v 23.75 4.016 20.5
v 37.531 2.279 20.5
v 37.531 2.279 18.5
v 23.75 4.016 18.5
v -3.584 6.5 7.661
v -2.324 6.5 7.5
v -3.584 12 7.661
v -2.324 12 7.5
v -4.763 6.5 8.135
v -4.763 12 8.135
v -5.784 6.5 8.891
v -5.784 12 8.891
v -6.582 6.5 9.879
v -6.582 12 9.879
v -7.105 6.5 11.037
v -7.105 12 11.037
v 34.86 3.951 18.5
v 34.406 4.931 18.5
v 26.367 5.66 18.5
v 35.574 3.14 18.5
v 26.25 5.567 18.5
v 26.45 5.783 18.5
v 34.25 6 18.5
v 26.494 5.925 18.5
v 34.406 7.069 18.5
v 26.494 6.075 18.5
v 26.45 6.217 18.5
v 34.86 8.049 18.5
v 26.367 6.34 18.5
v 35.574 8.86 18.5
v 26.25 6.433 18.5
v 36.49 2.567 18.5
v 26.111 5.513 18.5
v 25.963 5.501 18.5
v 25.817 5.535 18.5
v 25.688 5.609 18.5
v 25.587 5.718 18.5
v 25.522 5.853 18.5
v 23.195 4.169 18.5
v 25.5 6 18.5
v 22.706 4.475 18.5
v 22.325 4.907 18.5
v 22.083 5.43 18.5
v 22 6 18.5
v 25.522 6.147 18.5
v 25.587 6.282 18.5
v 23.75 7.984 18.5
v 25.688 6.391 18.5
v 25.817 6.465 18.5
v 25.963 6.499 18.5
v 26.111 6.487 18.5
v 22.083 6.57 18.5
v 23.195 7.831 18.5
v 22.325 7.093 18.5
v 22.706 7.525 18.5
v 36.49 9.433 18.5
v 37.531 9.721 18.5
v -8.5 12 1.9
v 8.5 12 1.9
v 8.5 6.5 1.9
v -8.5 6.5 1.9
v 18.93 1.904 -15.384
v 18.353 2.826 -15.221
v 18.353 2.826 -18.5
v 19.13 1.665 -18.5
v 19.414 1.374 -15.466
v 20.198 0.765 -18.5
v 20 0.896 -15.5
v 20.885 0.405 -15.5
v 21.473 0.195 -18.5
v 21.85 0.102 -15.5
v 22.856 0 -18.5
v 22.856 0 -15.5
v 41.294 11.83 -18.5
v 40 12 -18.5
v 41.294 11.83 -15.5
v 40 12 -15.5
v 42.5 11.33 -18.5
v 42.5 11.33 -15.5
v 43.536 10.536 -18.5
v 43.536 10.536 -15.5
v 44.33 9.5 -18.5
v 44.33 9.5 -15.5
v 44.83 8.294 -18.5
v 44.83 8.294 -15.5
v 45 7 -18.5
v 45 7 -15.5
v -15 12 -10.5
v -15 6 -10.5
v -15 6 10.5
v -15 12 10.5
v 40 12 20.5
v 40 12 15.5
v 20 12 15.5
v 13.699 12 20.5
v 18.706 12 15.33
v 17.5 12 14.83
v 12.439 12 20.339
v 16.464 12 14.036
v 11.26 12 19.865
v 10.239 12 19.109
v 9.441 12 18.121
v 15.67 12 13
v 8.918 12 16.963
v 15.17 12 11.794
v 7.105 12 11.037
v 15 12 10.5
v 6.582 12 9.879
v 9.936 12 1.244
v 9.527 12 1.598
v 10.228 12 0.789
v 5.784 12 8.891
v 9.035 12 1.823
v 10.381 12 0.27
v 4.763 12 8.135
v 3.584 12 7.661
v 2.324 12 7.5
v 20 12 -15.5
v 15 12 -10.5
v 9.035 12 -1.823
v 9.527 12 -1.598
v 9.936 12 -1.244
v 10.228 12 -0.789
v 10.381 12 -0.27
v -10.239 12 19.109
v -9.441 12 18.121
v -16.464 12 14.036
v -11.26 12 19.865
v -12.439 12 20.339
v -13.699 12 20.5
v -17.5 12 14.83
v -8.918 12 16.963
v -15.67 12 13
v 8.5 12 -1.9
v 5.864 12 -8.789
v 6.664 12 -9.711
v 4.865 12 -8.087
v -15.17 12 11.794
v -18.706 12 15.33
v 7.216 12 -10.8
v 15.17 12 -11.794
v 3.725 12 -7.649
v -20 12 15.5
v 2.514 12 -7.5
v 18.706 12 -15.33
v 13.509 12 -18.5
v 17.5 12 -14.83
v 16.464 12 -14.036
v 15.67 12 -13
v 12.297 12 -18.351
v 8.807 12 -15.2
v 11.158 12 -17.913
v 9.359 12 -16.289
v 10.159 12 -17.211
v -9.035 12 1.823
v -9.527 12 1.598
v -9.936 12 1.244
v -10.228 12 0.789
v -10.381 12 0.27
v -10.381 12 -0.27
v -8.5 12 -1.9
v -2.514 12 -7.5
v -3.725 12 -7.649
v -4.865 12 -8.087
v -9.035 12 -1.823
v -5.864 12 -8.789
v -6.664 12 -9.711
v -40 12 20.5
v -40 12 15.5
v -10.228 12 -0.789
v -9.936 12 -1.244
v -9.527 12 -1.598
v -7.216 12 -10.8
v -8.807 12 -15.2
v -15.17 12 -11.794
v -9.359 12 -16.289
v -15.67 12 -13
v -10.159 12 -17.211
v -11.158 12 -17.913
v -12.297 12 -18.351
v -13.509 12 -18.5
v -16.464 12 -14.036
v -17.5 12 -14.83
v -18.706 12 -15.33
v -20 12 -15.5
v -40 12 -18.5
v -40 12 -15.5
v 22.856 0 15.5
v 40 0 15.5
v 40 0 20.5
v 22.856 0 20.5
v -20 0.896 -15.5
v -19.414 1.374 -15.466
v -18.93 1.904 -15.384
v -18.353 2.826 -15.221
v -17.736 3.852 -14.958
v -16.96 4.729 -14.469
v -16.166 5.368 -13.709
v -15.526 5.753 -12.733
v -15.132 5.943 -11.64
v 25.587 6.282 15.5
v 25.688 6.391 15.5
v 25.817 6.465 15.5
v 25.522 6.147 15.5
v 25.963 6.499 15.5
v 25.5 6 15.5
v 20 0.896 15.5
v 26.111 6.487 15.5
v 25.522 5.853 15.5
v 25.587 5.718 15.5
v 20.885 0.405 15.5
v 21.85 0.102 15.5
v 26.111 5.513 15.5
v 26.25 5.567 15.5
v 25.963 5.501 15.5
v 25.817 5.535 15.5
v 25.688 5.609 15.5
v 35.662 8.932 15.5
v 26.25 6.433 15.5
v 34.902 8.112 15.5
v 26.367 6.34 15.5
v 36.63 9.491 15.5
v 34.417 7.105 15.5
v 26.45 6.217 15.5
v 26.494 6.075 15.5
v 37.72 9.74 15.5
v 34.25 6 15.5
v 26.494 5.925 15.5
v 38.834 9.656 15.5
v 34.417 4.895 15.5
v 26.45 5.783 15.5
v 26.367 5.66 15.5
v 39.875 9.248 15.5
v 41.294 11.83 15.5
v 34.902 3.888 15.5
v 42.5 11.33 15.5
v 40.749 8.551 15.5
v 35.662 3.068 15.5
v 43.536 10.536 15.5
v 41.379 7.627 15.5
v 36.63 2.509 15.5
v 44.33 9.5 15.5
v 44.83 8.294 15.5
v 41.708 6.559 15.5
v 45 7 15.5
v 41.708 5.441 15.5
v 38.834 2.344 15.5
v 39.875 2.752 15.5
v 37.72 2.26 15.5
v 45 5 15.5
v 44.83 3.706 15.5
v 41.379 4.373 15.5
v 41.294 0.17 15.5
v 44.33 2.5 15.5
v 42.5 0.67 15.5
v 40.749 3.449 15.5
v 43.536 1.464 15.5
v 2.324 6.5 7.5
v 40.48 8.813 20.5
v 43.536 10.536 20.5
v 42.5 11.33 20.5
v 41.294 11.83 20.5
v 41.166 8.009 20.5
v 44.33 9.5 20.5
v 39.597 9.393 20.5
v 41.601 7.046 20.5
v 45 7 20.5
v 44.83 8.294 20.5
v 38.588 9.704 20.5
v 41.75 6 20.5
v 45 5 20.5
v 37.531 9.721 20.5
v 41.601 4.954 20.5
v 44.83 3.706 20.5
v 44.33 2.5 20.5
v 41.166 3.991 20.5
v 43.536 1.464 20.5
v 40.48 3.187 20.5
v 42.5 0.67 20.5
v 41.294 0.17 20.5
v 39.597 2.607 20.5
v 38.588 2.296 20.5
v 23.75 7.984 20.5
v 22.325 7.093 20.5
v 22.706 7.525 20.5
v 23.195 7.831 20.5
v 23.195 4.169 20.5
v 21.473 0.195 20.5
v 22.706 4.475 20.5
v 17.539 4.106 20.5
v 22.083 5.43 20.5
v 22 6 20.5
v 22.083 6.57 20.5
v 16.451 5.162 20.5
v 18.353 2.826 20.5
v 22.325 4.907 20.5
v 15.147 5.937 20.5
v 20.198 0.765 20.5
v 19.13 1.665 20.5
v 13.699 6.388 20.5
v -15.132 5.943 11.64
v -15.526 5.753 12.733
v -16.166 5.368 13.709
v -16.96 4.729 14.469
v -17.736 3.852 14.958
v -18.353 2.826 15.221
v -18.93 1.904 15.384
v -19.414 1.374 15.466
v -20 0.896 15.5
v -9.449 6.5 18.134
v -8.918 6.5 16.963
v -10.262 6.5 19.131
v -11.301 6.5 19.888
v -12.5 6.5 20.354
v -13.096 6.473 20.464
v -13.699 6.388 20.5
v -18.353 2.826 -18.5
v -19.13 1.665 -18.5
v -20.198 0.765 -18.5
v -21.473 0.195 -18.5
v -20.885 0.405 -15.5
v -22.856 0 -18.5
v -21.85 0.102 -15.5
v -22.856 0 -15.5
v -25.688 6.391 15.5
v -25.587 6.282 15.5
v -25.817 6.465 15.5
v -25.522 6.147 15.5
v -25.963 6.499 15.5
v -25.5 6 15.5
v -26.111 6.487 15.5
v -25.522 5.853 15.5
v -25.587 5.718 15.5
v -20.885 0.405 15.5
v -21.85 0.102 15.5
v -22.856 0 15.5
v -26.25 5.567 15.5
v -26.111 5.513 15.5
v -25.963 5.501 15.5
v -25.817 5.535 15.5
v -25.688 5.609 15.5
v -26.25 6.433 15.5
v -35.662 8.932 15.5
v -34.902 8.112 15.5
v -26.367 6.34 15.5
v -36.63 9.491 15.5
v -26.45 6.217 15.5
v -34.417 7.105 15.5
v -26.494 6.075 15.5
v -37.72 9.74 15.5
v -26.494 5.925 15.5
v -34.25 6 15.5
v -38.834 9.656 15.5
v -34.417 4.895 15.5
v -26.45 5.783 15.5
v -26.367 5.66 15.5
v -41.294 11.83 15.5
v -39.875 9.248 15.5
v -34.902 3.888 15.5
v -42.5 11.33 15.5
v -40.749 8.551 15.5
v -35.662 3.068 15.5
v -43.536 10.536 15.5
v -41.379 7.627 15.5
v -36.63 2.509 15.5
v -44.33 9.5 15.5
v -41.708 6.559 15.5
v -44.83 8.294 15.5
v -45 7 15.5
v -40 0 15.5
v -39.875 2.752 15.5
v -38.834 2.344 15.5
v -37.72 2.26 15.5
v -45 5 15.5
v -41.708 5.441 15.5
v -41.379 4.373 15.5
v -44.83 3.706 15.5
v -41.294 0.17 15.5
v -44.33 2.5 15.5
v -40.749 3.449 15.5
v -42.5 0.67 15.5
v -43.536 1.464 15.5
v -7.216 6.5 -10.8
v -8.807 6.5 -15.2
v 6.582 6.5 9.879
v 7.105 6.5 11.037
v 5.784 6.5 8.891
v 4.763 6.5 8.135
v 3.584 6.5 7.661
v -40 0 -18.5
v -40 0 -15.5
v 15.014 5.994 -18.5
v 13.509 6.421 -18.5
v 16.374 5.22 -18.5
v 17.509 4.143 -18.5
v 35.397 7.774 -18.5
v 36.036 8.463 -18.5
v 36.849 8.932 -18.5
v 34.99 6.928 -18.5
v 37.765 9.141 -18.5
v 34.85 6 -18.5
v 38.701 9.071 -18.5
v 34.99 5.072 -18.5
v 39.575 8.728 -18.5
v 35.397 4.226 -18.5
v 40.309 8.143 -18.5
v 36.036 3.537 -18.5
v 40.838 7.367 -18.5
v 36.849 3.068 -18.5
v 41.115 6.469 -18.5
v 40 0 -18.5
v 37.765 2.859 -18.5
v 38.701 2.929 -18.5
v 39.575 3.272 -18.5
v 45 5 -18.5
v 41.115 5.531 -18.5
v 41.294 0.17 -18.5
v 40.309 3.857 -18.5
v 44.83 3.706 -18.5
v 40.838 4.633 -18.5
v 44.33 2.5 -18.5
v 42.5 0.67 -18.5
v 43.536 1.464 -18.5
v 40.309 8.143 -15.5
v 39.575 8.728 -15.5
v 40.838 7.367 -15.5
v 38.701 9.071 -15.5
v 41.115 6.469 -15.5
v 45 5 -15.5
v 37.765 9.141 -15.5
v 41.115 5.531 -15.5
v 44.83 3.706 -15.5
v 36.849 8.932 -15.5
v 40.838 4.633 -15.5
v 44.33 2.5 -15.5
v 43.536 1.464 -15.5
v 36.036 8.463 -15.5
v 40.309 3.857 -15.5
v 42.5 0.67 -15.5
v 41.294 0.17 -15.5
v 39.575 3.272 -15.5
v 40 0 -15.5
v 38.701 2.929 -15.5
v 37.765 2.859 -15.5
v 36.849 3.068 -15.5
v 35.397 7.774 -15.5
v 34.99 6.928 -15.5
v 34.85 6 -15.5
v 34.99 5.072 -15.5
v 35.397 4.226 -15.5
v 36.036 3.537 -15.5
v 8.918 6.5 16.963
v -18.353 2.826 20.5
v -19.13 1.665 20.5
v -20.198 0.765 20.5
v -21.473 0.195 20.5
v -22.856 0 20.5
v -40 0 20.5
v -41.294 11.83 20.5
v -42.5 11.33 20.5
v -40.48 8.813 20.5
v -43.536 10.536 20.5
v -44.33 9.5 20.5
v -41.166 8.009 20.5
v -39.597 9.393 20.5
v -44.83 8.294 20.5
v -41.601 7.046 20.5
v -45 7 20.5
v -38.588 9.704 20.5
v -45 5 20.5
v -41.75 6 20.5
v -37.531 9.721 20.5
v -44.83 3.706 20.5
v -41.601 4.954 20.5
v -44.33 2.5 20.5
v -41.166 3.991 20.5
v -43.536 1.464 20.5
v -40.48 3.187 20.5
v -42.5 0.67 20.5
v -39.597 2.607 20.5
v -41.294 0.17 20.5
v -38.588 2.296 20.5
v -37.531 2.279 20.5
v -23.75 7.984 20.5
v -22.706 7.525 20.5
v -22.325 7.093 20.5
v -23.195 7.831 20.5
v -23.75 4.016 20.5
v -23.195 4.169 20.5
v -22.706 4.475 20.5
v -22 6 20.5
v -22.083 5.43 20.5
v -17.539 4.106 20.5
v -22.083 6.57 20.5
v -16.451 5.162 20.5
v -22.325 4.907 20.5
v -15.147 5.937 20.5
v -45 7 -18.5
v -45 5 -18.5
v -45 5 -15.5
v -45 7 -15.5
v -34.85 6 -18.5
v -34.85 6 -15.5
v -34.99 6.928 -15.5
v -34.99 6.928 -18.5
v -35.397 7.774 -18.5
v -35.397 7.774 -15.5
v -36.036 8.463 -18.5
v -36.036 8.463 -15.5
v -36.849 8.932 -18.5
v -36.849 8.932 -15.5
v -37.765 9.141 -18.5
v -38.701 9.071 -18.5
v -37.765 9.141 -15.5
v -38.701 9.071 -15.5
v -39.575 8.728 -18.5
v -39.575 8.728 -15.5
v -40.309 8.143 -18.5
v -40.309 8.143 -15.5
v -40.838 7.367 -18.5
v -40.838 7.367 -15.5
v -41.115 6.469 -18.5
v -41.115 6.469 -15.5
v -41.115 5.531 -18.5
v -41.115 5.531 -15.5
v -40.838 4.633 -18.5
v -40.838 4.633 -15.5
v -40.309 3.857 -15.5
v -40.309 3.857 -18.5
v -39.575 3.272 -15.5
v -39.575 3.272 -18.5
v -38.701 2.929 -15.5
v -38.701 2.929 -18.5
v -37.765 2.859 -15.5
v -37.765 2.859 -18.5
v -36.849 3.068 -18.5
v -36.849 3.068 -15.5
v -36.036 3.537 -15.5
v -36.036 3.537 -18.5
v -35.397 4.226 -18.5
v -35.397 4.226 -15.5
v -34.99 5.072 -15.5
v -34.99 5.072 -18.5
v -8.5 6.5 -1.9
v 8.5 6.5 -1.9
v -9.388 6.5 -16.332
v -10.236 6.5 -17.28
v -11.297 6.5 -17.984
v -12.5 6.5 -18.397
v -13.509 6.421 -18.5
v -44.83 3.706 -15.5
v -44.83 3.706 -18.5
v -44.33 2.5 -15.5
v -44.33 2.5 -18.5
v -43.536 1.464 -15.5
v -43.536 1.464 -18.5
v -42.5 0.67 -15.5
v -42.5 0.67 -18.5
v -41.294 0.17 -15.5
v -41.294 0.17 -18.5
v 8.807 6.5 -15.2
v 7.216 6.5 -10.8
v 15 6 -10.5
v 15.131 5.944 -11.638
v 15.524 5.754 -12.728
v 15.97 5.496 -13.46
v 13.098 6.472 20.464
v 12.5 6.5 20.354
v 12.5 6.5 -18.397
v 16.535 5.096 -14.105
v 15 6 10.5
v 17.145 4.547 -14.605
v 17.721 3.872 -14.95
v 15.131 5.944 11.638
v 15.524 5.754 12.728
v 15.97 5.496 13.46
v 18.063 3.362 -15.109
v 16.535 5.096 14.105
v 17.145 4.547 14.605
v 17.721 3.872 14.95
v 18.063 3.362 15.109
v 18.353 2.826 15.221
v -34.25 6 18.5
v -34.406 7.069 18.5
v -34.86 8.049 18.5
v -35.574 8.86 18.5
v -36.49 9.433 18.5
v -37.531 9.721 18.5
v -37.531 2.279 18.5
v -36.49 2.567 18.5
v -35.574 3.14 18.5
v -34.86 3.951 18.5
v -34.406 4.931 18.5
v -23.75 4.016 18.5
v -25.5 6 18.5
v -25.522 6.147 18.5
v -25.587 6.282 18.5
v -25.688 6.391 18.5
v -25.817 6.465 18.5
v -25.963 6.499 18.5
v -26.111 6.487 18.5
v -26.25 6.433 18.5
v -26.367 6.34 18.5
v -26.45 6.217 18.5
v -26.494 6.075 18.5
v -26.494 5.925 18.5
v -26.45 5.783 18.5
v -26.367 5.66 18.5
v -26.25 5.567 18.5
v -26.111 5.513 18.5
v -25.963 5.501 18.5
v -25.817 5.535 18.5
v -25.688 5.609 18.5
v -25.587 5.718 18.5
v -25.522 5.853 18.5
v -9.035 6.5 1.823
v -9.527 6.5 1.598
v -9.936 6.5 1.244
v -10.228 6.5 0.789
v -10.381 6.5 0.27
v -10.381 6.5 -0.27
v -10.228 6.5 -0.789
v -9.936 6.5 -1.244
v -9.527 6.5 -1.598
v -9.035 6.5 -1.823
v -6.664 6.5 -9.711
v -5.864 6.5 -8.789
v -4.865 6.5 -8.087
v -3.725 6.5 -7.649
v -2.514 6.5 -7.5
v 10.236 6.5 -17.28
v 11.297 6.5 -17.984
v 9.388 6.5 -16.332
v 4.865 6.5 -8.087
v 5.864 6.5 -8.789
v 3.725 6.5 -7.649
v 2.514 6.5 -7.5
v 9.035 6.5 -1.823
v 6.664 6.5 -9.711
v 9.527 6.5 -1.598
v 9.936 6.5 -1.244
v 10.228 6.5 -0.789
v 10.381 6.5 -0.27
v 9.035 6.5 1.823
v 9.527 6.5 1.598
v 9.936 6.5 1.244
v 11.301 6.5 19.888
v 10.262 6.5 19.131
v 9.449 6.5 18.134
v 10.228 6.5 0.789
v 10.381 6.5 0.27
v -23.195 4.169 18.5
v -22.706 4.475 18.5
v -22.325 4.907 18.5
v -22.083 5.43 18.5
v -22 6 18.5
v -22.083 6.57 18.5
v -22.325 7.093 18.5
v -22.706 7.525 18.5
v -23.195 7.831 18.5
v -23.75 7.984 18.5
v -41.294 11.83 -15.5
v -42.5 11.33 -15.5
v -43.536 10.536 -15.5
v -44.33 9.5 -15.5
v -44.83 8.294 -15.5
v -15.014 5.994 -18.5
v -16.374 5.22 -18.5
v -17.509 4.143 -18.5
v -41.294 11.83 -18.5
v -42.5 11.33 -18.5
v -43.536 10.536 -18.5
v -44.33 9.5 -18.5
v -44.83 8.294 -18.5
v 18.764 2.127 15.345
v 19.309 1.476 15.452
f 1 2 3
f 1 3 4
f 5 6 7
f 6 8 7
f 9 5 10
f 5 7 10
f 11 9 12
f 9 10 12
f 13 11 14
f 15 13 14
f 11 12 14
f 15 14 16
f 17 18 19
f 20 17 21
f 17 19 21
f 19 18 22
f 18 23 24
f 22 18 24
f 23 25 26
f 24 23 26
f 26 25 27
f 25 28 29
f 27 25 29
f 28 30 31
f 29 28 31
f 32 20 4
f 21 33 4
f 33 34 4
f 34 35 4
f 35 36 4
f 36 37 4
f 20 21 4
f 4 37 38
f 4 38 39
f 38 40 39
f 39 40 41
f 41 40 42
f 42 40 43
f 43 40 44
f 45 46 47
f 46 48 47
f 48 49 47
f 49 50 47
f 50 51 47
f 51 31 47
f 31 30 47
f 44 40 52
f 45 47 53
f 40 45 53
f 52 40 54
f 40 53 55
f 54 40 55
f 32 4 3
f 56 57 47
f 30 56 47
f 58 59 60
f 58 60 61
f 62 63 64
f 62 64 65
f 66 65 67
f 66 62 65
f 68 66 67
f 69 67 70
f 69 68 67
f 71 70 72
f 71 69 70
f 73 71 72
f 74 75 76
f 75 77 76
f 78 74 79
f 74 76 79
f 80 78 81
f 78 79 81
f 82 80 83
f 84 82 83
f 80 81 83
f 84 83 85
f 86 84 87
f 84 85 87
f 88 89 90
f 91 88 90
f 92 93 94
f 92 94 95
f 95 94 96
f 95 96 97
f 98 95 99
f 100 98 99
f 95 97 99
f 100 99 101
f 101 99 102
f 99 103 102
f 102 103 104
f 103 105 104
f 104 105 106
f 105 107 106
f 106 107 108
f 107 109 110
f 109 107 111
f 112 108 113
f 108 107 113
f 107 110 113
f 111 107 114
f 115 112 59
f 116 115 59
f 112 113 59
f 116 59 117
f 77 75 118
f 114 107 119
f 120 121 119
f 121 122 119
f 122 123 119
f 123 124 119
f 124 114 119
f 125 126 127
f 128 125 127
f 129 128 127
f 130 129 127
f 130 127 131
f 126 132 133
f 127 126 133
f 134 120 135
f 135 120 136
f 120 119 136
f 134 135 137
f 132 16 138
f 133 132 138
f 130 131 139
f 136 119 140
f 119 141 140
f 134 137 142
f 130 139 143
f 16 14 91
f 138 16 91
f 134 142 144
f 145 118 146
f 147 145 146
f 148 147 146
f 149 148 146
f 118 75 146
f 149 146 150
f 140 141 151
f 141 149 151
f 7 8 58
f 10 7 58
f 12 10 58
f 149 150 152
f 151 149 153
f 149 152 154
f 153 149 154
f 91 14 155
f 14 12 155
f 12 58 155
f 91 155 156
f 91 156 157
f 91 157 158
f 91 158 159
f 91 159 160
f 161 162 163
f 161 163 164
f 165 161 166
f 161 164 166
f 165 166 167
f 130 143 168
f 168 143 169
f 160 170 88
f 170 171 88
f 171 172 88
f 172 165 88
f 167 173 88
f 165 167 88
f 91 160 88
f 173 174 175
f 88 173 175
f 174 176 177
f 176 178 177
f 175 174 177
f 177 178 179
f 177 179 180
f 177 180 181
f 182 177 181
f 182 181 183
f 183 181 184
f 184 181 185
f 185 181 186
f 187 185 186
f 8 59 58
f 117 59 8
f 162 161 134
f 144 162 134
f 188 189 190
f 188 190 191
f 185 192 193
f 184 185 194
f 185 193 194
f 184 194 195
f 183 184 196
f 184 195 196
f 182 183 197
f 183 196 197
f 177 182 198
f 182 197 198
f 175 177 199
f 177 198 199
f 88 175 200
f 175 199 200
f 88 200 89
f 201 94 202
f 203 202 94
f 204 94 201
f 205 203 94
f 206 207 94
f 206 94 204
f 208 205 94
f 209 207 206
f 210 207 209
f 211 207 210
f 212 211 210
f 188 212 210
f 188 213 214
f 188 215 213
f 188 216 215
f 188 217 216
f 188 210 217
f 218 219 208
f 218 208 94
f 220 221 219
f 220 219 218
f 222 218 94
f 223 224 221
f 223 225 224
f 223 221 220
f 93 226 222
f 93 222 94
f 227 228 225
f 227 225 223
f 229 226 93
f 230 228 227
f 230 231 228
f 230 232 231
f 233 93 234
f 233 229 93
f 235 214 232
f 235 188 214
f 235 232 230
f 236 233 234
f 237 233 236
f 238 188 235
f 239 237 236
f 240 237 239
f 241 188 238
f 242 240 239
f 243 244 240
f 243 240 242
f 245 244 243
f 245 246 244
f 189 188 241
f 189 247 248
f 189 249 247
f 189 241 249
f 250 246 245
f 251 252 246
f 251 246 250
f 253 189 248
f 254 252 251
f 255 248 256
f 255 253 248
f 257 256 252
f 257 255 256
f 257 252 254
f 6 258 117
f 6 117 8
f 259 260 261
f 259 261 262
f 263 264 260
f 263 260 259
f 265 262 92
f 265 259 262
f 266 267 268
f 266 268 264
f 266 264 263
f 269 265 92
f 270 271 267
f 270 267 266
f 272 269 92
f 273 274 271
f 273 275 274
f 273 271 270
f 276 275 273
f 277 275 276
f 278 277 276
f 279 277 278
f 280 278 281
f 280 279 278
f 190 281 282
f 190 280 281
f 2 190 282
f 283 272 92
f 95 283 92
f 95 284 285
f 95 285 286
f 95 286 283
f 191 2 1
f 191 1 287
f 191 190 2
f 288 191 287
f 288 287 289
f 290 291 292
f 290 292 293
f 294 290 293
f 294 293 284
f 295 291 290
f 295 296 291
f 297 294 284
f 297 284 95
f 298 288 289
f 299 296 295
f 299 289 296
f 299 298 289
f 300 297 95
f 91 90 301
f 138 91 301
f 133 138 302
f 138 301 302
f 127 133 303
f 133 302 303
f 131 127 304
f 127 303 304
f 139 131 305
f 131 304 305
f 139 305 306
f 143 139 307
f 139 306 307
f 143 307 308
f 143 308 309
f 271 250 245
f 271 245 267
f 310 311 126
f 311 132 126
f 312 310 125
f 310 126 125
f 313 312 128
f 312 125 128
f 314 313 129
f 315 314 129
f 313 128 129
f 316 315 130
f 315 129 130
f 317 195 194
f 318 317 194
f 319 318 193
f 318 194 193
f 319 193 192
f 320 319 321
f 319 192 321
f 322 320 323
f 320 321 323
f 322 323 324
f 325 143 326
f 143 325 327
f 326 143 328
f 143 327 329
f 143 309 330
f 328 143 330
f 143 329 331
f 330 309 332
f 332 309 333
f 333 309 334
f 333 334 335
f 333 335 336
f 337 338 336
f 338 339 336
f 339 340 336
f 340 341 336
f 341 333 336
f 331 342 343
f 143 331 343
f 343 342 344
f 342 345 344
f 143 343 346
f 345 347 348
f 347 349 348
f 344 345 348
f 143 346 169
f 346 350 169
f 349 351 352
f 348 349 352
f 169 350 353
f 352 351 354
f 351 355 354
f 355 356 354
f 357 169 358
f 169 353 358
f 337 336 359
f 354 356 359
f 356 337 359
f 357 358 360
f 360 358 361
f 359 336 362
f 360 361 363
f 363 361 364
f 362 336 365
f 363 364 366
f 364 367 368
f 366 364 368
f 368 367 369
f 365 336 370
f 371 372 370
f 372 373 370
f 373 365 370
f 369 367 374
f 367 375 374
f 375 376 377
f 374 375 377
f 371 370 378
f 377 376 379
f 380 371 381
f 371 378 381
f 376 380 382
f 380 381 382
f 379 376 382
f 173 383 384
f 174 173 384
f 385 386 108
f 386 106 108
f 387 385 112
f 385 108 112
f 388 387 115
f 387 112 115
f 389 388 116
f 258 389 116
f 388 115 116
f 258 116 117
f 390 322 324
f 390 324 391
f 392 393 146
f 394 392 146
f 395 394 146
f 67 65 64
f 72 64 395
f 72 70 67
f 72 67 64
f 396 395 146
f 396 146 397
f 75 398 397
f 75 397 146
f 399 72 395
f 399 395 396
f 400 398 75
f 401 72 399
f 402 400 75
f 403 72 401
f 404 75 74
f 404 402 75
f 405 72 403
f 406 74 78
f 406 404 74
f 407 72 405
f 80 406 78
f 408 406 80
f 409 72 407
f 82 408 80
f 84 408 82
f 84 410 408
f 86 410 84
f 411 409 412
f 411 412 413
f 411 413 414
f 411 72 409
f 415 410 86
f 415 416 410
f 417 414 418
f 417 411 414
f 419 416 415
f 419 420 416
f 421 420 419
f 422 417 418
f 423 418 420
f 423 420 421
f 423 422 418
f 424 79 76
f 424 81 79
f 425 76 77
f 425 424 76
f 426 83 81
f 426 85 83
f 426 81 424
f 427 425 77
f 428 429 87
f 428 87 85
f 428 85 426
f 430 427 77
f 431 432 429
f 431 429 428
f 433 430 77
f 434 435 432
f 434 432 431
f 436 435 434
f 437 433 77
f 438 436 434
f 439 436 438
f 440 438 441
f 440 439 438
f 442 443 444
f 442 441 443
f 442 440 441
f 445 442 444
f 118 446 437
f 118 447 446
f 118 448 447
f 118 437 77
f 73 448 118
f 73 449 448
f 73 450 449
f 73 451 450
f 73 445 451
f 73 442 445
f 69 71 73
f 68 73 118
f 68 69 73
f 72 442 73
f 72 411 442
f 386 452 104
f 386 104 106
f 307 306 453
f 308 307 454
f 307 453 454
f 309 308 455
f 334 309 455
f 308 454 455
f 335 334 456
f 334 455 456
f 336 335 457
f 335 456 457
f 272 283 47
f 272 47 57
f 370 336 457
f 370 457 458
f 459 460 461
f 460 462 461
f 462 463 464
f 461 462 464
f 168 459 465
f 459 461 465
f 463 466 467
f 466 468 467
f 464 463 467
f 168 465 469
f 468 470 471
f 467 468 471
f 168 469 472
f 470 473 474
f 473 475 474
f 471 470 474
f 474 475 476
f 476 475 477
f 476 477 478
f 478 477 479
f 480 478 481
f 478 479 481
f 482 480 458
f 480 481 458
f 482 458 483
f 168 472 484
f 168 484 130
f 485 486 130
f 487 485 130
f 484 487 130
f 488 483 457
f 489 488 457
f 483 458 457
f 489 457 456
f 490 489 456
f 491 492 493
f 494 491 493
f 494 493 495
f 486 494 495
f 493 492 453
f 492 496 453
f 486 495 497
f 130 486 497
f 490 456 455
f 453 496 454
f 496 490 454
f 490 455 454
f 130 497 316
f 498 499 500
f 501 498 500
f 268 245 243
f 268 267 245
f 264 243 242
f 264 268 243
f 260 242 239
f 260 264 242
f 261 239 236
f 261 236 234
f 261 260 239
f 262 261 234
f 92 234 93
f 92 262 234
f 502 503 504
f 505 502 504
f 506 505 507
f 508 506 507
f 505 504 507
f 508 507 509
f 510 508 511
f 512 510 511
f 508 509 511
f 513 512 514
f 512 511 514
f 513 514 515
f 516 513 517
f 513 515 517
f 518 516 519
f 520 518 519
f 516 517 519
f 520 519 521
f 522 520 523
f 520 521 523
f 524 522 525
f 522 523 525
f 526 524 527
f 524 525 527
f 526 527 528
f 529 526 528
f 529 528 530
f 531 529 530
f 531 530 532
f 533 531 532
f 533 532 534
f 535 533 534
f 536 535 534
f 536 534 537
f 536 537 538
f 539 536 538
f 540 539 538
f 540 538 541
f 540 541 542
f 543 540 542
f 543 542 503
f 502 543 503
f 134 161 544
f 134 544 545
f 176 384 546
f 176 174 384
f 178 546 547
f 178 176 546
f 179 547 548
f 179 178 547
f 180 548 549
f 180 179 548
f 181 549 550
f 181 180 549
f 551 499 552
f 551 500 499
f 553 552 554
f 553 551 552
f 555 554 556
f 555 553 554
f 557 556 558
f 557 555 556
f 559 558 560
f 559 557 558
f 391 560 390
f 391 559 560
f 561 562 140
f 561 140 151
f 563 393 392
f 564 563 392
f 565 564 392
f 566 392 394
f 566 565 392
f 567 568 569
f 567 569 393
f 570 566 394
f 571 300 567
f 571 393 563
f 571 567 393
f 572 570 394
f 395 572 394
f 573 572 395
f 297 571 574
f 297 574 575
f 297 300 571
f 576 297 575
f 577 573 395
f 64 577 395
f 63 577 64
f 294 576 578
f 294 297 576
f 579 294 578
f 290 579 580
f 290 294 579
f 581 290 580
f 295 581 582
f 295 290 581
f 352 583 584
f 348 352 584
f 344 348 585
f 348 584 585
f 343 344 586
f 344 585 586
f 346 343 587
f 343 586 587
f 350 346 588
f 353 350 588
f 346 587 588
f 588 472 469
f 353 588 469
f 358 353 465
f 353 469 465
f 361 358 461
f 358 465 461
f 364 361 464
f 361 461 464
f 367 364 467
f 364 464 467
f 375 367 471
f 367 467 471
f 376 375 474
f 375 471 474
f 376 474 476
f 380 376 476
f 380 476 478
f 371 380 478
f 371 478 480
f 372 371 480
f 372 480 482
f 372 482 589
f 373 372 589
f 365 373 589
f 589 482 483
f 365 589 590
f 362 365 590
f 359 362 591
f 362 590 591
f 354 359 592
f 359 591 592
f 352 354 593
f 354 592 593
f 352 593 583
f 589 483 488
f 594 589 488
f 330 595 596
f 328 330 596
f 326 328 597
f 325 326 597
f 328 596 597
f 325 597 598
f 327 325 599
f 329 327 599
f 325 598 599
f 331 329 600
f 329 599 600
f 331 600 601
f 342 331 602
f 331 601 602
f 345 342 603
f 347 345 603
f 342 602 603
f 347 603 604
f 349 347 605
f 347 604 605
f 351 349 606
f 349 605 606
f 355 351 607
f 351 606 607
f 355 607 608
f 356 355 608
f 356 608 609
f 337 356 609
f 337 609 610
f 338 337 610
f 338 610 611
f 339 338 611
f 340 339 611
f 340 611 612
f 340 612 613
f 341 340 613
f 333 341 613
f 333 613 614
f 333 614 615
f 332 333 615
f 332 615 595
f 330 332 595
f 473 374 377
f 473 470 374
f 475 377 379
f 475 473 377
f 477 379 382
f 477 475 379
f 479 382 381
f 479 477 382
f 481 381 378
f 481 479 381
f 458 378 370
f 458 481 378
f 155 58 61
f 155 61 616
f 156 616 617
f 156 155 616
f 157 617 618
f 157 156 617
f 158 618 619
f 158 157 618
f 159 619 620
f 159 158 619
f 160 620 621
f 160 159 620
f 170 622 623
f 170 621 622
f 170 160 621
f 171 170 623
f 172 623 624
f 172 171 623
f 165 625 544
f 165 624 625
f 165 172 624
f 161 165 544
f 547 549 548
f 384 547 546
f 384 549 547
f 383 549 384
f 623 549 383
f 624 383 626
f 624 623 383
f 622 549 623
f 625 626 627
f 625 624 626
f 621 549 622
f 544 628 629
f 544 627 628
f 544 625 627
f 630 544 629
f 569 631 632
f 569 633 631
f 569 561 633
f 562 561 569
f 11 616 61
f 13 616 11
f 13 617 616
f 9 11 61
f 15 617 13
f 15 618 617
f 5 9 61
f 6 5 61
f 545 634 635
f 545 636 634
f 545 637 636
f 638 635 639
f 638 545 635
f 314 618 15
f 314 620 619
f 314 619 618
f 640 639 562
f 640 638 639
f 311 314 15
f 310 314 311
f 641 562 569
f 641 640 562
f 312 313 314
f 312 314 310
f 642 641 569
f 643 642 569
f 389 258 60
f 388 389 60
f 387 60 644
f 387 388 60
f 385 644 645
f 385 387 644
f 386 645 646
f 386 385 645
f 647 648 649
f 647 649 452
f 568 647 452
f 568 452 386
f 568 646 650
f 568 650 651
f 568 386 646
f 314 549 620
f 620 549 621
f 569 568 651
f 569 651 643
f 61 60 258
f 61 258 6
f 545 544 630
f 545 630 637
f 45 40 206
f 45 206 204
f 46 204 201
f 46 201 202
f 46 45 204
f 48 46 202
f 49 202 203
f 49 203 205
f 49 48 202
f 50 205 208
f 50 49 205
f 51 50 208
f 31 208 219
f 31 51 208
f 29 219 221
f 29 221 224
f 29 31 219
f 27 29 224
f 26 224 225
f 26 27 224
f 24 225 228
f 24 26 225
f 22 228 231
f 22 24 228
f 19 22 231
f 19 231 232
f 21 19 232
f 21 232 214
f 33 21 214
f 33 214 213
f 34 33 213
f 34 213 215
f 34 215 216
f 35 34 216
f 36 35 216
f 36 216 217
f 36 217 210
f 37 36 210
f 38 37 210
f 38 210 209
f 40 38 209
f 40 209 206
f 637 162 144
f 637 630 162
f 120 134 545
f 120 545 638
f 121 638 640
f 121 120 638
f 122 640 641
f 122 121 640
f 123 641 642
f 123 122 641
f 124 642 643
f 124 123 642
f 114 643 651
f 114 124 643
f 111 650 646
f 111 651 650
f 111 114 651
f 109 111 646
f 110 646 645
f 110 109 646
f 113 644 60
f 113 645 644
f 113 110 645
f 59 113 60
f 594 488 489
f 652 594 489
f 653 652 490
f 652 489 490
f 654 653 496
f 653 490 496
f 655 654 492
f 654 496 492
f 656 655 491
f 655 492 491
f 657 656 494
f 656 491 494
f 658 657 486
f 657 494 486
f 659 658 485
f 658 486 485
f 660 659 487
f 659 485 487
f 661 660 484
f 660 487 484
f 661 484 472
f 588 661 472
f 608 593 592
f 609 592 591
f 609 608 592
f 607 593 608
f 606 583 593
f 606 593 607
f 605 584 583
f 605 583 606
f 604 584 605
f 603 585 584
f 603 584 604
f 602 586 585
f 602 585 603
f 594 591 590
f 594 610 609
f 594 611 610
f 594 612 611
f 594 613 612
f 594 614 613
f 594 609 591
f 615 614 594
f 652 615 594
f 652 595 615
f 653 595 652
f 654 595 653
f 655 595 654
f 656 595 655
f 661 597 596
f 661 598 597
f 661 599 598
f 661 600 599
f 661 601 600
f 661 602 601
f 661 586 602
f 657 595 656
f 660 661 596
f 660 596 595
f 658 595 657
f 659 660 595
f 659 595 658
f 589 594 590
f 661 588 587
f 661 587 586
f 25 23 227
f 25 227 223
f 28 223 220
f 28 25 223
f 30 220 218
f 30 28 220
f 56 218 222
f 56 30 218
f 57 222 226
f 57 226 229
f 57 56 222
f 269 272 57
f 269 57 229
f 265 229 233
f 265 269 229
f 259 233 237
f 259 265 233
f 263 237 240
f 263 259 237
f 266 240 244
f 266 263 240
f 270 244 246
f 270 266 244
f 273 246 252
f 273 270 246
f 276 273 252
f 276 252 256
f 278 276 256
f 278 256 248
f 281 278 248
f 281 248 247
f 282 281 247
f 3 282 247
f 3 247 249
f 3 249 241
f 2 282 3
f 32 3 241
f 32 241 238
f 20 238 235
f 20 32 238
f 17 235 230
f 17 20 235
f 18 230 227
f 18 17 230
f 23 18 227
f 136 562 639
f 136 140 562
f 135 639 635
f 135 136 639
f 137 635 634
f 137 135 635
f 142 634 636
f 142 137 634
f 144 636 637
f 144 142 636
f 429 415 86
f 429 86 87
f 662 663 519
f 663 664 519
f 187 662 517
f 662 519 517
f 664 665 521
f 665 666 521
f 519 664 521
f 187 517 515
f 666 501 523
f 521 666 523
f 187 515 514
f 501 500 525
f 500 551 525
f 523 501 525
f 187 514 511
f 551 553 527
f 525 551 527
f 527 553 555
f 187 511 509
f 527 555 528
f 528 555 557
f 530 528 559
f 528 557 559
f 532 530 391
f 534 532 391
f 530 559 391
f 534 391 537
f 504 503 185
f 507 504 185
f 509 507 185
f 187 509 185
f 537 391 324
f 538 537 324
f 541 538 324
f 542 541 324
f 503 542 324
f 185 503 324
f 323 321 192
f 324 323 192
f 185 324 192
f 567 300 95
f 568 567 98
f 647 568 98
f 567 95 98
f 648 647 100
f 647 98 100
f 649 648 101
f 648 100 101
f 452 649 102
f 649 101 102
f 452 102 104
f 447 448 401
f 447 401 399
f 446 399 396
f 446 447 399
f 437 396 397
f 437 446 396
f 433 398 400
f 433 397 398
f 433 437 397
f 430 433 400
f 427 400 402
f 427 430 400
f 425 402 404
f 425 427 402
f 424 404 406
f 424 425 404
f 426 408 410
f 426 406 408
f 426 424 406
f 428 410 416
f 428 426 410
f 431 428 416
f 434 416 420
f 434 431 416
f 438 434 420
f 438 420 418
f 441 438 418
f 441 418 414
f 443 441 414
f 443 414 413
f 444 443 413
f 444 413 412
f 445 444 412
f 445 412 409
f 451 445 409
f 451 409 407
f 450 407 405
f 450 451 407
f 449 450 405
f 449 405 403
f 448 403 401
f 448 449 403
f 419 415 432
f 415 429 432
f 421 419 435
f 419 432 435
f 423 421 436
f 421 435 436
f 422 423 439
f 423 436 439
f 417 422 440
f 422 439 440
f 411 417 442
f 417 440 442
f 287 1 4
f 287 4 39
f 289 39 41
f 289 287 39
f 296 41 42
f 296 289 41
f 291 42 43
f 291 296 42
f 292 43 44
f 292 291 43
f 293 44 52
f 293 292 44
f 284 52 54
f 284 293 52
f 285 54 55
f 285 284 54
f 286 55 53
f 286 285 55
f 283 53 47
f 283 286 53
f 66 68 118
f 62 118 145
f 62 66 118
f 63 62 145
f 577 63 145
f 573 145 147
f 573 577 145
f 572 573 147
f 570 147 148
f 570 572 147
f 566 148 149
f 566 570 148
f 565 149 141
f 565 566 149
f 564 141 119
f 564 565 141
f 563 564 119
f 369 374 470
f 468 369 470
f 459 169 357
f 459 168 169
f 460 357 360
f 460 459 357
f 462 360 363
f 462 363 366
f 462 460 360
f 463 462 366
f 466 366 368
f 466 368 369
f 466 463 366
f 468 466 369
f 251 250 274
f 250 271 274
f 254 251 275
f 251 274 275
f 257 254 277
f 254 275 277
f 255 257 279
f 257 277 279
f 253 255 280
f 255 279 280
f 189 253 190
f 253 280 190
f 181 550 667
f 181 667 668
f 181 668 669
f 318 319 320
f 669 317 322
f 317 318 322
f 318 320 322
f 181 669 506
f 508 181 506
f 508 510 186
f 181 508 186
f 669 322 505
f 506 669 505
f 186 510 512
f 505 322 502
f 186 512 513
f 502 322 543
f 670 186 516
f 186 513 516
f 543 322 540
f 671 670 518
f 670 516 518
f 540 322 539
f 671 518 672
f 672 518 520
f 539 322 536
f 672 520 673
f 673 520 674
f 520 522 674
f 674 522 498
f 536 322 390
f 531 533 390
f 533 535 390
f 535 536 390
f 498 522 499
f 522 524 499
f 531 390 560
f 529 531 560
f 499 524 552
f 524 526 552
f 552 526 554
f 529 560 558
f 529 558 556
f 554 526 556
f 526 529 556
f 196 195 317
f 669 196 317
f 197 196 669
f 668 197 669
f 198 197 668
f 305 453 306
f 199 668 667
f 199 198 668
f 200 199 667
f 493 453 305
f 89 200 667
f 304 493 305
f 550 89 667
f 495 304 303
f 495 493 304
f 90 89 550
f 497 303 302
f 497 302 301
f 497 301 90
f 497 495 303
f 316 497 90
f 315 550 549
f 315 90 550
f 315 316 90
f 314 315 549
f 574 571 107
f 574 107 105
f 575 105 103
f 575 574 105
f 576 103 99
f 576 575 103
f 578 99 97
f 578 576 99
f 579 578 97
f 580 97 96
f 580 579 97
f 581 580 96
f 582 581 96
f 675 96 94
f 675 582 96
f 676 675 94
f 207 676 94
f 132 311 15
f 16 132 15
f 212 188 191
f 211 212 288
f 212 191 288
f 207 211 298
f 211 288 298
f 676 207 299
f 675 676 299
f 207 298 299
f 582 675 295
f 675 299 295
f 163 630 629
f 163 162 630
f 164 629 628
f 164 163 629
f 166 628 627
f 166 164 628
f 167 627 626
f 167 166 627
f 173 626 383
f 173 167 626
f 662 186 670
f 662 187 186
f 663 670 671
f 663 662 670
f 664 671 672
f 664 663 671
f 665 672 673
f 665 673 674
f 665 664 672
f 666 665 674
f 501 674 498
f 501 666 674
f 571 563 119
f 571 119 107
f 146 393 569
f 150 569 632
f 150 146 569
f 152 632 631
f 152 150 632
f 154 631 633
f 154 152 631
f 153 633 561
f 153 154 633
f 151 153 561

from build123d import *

# Parameters (mm, degrees)
Y_KSEKLIK_EKSTR_ZYON1_DEPTH = 12
IZIM3_R                     = 3.15
KES_EKSTR_ZYON1_DEPTH       = 61.745370194
KES_EKSTR_ZYON2_DEPTH       = 2
KES_EKSTR_ZYON5_REACH       = 62.745
IZIM8_R                     = 3.75
KES_EKSTR_ZYON3_REACH       = 61.481
IZIM6_R                     = 0.5
KES_EKSTR_ZYON4_DEPTH       = 21
RADYUS1_R                   = 5
FILLET1_R                   = 5
CUT_EXTRUDE2_DEPTH          = 10


with BuildPart() as part:
    # Çizim2 → Yükseklik-Ekstrüzyon1 (new body)
    with BuildSketch(Plane(origin=(0, 0, 0), x_dir=(1, 0, 0), z_dir=(0, 1, 0))):
        with BuildLine():
            Line((-45, -15.5), (-45, -20.5))
            Line((-45, -20.5), (-10, -20.5))
            Line((-10, -20.5), (-6.022579038, -7.5))
            Line((-6.022579038, -7.5), (0, -7.5))
            Line((0, -7.5), (0, 7.5))
            Line((0, 7.5), (-6.022579038, 7.5))
            Line((-6.022579038, 7.5), (-10, 18.5))
            Line((-10, 18.5), (-45, 18.5))
            Line((-45, 18.5), (-45, 15.5))
            Line((-45, 15.5), (-20, 15.5))
            ThreePointArc((-20, 15.5), (-16.464466094, 14.035533906), (-15, 10.5))
            Line((-15, 10.5), (-15, -10.5))
            ThreePointArc((-15, -10.5), (-16.464466094, -14.035533906), (-20, -15.5))
            Line((-20, -15.5), (-45, -15.5))
        make_face()
    y_kseklik_ekstr_zyon1 = extrude(amount=Y_KSEKLIK_EKSTR_ZYON1_DEPTH)

    # Çizim3 → Kes-Ekstrüzyon1 (cut, through all)
    with BuildSketch(Plane.XY.offset(20.5)):
        with Locations((-38, 6)):
            Circle(IZIM3_R)
    kes_ekstr_zyon1 = extrude(amount=-KES_EKSTR_ZYON1_DEPTH, mode=Mode.SUBTRACT)

    # Çizim5 → Kes-Ekstrüzyon2 (cut)
    with BuildSketch(Plane.XY.offset(20.5)):
        with BuildLine():
            ThreePointArc((-34.25, 6), (-35.1875, 3.519608146), (-37.53125, 2.279412219))
            Line((-37.53125, 2.279412219), (-23.75, 4.015686517))
            ThreePointArc((-23.75, 4.015686517), (-22, 6), (-23.75, 7.984313483))
            Line((-23.75, 7.984313483), (-37.53125, 9.720587781))
            ThreePointArc((-37.53125, 9.720587781), (-35.1875, 8.480391854), (-34.25, 6))
        make_face()
    kes_ekstr_zyon2 = extrude(amount=-KES_EKSTR_ZYON2_DEPTH, mode=Mode.SUBTRACT)

    # Çizim8 → Kes-Ekstrüzyon5 (cut, up to next)
    with BuildSketch(Plane.XY.offset(20.5), mode=Mode.PRIVATE) as kes_ekstr_zyon5_sk1:
        with Locations((-38, 6)):
            Circle(IZIM8_R)
    kes_ekstr_zyon5_tool1 = extrude(kes_ekstr_zyon5_sk1.sketch, amount=-KES_EKSTR_ZYON5_REACH, mode=Mode.PRIVATE) & part.part
    kes_ekstr_zyon5 = kes_ekstr_zyon5_tool1.solids().sort_by_distance((-38, 6, 20.5))[0]
    add(kes_ekstr_zyon5, mode=Mode.SUBTRACT)

    # Çizim6 → Kes-Ekstrüzyon3 (cut, up to next)
    with BuildSketch(Plane.XY.offset(18.5), mode=Mode.PRIVATE) as kes_ekstr_zyon3_sk1:
        with Locations((-26, 6)):
            Circle(IZIM6_R)
    kes_ekstr_zyon3_tool1 = extrude(kes_ekstr_zyon3_sk1.sketch, amount=-KES_EKSTR_ZYON3_REACH, mode=Mode.PRIVATE) & part.part
    kes_ekstr_zyon3 = kes_ekstr_zyon3_tool1.solids().sort_by_distance((-26, 6, 18.5))[0]
    add(kes_ekstr_zyon3, mode=Mode.SUBTRACT)

    # Aynalama1: Yükseklik-Ekstrüzyon1, Kes-Ekstrüzyon1, Kes-Ekstrüzyon2, Kes-Ekstrüzyon5, Kes-Ekstrüzyon3 across plane
    add(y_kseklik_ekstr_zyon1.mirror(Plane(origin=(0, 12, -7.5), x_dir=(0, 0, 1), z_dir=(-1, 0, 0))))
    add(kes_ekstr_zyon1.mirror(Plane(origin=(0, 12, -7.5), x_dir=(0, 0, 1), z_dir=(-1, 0, 0))), mode=Mode.SUBTRACT)
    add(kes_ekstr_zyon2.mirror(Plane(origin=(0, 12, -7.5), x_dir=(0, 0, 1), z_dir=(-1, 0, 0))), mode=Mode.SUBTRACT)
    add(kes_ekstr_zyon5.mirror(Plane(origin=(0, 12, -7.5), x_dir=(0, 0, 1), z_dir=(-1, 0, 0))), mode=Mode.SUBTRACT)
    add(kes_ekstr_zyon3.mirror(Plane(origin=(0, 12, -7.5), x_dir=(0, 0, 1), z_dir=(-1, 0, 0))), mode=Mode.SUBTRACT)

    # Çizim7 → Kes-Ekstrüzyon4 (cut, symmetric)
    with BuildSketch(Plane.XY):
        with BuildLine():
            Line((-12.5, 6.5), (12.5, 6.5))
            ThreePointArc((12.5, 6.5), (19, 0), (12.5, -6.5))
            Line((12.5, -6.5), (-12.5, -6.5))
            ThreePointArc((-12.5, -6.5), (-19, 0), (-12.5, 6.5))
        make_face()
    extrude(amount=KES_EKSTR_ZYON4_DEPTH, both=True, mode=Mode.SUBTRACT)

    # Radyus1
    radyus1_edges = [part.edges().sort_by_distance(p)[0] for p in [
        (-45, 0, -17),
        (-19, 0, 17.949489743),
        (-19, 0, -16.949489743),
        (19, 0, 17.949489743),
        (19, 0, -16.949489743),
        (-45, 0, 18),
        (-45, 12, -17),
        (-45, 12, 18),
        (45, 12, -17),
        (45, 12, 18),
        (45, 0, 18),
        (45, 0, -17),
    ]]
    fillet(radyus1_edges, radius=RADYUS1_R)

    # Fillet1
    fillet1_edges = [part.edges().sort_by_distance(p)[0] for p in [
        (10, 9.25, 20.5),
        (6.022579038, 9.25, 7.5),
        (-10, 9.25, 20.5),
        (-6.022579038, 9.25, 7.5),
        (10, 9.25, -18.5),
        (6.022579038, 9.25, -7.5),
        (-10, 9.25, -18.5),
        (-6.022579038, 9.25, -7.5),
    ]]
    fillet(fillet1_edges, radius=FILLET1_R)

    # Sketch2 → Cut-Extrude2 (cut)
    with BuildSketch(Plane(origin=(0, 12, 0), x_dir=(1, 0, 0), z_dir=(0, 1, 0))):
        with BuildLine():
            Line((8.5, -1.9), (-8.5, -1.9))
            ThreePointArc((-8.5, -1.9), (-10.4, 0), (-8.5, 1.9))
            Line((-8.5, 1.9), (8.5, 1.9))
            ThreePointArc((8.5, 1.9), (10.4, 0), (8.5, -1.9))
        make_face()
    extrude(amount=-CUT_EXTRUDE2_DEPTH, mode=Mode.SUBTRACT)


solid = part.part
